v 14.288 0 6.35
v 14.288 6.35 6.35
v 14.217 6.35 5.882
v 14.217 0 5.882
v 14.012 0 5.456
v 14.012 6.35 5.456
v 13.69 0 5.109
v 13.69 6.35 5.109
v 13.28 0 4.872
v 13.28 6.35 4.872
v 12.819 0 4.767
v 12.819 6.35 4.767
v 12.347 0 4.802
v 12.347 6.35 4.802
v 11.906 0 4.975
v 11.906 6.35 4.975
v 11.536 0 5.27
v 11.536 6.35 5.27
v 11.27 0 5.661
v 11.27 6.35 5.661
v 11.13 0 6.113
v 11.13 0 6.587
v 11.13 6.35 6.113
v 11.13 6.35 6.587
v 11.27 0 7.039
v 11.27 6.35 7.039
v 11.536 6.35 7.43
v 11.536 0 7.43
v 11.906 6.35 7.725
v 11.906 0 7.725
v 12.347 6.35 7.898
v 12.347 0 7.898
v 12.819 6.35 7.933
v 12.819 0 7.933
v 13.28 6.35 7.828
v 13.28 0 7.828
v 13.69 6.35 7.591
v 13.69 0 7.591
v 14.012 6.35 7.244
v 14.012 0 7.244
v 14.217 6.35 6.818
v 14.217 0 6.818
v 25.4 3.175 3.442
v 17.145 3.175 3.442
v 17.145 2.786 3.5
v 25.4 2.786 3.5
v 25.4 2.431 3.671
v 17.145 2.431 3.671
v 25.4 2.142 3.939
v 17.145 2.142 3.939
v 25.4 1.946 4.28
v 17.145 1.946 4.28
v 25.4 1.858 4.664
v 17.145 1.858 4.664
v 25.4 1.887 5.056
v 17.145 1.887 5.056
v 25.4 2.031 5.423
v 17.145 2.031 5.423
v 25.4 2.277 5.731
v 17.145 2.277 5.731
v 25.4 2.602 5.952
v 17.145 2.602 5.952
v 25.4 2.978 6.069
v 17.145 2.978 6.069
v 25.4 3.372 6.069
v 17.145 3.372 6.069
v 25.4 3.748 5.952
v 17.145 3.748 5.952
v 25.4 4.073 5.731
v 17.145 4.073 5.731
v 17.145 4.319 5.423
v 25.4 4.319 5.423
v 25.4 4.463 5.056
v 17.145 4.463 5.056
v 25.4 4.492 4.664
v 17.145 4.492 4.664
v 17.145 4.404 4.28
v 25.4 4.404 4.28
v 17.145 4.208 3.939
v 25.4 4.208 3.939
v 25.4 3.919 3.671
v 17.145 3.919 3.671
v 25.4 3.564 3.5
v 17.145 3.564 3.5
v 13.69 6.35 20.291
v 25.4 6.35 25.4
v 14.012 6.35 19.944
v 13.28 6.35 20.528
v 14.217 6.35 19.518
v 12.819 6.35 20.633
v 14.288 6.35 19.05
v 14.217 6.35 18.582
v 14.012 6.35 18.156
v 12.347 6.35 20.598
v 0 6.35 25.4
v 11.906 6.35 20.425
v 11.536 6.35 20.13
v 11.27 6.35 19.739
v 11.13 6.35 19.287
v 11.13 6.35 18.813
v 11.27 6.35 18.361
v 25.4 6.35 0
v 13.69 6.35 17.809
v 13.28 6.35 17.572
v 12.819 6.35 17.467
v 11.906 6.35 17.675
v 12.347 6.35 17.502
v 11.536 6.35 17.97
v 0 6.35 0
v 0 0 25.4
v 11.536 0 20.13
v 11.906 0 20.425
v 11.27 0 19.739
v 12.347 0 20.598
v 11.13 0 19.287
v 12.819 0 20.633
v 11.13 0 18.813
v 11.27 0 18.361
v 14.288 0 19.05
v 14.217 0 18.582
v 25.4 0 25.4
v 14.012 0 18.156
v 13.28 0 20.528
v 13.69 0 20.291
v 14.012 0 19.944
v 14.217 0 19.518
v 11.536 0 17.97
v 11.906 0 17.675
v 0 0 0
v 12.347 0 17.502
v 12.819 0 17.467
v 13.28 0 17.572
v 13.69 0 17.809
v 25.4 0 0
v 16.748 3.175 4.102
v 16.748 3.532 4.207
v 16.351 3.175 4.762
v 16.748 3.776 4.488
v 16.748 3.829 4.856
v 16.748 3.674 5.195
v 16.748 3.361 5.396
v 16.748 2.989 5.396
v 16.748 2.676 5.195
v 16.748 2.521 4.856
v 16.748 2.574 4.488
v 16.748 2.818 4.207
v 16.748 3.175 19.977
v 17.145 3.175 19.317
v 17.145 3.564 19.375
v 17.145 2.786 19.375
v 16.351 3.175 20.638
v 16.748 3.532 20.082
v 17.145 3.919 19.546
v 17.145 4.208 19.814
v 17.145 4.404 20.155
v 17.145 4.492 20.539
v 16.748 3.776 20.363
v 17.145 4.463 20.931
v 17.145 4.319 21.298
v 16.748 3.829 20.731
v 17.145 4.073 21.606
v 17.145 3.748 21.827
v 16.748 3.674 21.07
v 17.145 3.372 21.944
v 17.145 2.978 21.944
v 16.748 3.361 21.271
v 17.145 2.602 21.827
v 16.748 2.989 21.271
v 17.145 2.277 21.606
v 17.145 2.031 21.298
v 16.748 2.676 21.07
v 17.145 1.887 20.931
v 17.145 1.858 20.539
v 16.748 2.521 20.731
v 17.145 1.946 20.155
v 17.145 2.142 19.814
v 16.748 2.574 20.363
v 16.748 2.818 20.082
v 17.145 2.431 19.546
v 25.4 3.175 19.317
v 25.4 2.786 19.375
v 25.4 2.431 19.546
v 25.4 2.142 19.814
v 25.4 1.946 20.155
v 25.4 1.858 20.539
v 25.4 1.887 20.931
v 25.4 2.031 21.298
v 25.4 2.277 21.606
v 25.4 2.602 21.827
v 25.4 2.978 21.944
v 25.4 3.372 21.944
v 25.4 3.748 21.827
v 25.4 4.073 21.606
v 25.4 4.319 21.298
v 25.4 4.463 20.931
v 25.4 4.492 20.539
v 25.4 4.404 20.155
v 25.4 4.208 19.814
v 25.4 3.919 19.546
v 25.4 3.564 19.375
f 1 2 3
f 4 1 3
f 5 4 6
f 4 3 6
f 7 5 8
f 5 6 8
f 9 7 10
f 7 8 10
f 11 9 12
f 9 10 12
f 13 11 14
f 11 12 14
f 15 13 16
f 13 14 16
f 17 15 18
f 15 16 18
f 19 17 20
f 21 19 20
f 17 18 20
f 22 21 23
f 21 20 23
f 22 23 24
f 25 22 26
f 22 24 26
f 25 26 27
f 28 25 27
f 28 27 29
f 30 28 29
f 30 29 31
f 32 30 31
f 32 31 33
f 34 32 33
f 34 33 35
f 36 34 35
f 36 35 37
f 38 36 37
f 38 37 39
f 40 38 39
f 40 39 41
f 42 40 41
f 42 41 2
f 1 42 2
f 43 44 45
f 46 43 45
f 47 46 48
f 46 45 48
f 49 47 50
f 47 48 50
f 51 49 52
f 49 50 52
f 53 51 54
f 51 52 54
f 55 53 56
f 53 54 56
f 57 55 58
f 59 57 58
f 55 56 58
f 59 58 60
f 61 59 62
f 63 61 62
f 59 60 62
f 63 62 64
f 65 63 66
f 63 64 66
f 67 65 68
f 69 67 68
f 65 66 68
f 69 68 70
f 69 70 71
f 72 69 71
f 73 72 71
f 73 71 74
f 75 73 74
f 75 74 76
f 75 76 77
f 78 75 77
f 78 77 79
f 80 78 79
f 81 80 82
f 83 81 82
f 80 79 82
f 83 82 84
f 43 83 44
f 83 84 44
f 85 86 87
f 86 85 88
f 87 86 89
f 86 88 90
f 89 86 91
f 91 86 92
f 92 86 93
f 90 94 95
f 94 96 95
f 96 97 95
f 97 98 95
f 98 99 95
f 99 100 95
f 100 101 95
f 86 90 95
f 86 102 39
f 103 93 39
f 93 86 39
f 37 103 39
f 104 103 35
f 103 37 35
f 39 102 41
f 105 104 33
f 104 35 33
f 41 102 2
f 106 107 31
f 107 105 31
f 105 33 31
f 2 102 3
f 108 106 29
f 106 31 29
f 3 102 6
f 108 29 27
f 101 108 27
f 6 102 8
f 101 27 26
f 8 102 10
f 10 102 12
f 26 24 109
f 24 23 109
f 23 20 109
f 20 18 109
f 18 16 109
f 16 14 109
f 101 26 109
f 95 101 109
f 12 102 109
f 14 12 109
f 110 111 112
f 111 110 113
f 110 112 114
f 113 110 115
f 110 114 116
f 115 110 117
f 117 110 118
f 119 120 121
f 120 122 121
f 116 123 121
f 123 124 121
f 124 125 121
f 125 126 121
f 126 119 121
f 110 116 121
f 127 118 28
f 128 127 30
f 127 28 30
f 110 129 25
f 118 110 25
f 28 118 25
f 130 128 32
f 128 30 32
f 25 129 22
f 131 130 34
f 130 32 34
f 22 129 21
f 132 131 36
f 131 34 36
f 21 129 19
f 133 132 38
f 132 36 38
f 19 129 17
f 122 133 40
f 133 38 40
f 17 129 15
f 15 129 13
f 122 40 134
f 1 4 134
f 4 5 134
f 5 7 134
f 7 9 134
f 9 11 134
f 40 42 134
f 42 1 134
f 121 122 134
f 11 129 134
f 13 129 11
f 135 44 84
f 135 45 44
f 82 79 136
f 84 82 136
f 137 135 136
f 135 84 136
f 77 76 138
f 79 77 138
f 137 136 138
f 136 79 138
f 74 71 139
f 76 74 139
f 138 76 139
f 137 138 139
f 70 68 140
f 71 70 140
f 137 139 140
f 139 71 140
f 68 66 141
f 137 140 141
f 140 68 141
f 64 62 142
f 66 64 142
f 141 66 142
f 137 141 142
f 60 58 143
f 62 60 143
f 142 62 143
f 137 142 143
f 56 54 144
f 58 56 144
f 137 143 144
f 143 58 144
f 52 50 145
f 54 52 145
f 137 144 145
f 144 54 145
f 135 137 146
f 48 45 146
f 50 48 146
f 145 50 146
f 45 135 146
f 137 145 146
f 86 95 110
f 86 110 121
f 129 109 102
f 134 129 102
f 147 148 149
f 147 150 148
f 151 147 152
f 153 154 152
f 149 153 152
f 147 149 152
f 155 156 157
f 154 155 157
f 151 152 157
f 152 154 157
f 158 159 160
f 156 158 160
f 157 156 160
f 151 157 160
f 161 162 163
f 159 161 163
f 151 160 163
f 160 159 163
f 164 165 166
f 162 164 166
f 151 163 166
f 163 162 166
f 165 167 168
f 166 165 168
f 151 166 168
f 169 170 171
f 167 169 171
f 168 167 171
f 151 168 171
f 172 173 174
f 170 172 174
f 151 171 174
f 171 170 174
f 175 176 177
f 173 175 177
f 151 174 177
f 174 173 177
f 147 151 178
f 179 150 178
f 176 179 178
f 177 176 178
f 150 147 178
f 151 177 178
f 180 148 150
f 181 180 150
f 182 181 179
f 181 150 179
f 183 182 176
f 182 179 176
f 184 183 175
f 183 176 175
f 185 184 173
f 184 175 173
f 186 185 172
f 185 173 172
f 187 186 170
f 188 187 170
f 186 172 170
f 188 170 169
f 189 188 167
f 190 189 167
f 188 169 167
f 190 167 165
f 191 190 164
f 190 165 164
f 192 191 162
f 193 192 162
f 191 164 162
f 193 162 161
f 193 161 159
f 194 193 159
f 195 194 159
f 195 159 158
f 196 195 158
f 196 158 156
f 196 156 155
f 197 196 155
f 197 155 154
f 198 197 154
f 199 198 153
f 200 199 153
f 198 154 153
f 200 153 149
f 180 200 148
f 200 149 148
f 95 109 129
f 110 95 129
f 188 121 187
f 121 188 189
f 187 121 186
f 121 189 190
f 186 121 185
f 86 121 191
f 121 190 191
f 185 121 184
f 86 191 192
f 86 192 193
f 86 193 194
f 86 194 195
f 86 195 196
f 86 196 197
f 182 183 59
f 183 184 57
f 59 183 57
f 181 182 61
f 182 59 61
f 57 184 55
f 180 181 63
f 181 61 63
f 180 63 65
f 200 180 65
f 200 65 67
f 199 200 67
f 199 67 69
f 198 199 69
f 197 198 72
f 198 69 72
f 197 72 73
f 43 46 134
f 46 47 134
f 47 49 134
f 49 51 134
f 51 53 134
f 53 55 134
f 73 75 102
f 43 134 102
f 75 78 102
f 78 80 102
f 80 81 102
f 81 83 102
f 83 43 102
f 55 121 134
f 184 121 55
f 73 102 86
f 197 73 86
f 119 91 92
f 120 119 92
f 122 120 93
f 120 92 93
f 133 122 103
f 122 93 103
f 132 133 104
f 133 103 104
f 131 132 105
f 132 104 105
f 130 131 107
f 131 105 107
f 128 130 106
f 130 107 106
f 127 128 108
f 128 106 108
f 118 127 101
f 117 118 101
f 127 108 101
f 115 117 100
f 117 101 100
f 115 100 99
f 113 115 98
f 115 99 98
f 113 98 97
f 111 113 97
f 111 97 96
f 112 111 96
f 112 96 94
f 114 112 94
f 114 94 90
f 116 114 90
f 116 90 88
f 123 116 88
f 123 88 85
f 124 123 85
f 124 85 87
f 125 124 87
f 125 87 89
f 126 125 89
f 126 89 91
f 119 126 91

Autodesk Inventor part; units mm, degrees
ref_plane "YZ Plane" through (0, 0, 0) normal (1, 0, 0) x (0, 1, 0)
ref_plane "XZ Plane" through (0, 0, 0) normal (0, 1, 0) x (-1, 0, 0)
ref_plane "XY Plane" through (0, 0, 0) normal (0, 0, 1) x (1, 0, 0)
sketch "Sketch1" plane through (0, 0, 0) normal (0, 0, 1) x (1, 0, 0)
  line L0 (0, 0) -> (25.4, 0)
  line L1 (25.4, 0) -> (25.4, 6.35)
  line L2 (25.4, 6.35) -> (0, 6.35)
  line L3 (0, 6.35) -> (0, 0)
  dimension "d0" = 25.4
  dimension "d1" = 6.35
extrude "Extrusion1" add sketch "Sketch1" along normal blind 25.4
sketch "Sketch2" plane through (0, 6.35, 0) normal (0, 1, 0) x (1, 0, 0)
  line L0 (0, 0) -> (25.4, 0) projected
  line L1 (12.7, 0) -> (12.7, -25.4)
  line L2 (0, -25.4) -> (25.4, -25.4) projected
  line L3 (0, 0) -> (0, -25.4) projected
  line L4 (0, -12.7) -> (25.4, -12.7)
  line L5 (25.4, 0) -> (25.4, -25.4) projected
  line L6 (12.7, -12.7) -> (12.7, -6.35)
  line L7 (12.7, -12.7) -> (12.7, -19.05)
  circle A0 centre (12.7, -6.35) radius 1.5875
  circle A1 centre (12.7, -19.05) radius 1.5875
  dimension "d4" = 6.35
  dimension "d5" = 6.35
  dimension "d6" = 3.175
  dimension "d7" = 3.175
extrude "Extrusion2" cut sketch "Sketch2" against normal blind 25.4 contours A0 L1 | L1 A0 | A1 L1 | L1 A1
sketch "Sketch3" plane through (25.4, 0, 0) normal (1, 0, 0) x (0, 0, -1)
  line L0 (-25.4, 0) -> (-25.4, 6.35) projected
  line L1 (-25.4, 3.175) -> (0, 3.175)
  line L2 (0, 0) -> (0, 6.35) projected
  line L3 (-20.6375, 6.35) -> (-20.6375, 0) projected
  line L4 (-20.6375, 6.35) -> (-20.6375, 3.175)
  line L5 (-4.7625, 6.35) -> (-4.7625, 0) projected
  line L6 (-4.7625, 6.35) -> (-4.7625, 3.175)
hole "Hole1" at (25.4, 3.175, 20.6375) at (25.4, 3.175, 4.7625) direction (-1, 0, 0) diameter 2.6416 depth 8.255 tip angle 118 thread size "6-32 UNC" class "2B" standard "ANSI Unified Screw Threads"
properties part number "ElectronicsPlateConnector"
